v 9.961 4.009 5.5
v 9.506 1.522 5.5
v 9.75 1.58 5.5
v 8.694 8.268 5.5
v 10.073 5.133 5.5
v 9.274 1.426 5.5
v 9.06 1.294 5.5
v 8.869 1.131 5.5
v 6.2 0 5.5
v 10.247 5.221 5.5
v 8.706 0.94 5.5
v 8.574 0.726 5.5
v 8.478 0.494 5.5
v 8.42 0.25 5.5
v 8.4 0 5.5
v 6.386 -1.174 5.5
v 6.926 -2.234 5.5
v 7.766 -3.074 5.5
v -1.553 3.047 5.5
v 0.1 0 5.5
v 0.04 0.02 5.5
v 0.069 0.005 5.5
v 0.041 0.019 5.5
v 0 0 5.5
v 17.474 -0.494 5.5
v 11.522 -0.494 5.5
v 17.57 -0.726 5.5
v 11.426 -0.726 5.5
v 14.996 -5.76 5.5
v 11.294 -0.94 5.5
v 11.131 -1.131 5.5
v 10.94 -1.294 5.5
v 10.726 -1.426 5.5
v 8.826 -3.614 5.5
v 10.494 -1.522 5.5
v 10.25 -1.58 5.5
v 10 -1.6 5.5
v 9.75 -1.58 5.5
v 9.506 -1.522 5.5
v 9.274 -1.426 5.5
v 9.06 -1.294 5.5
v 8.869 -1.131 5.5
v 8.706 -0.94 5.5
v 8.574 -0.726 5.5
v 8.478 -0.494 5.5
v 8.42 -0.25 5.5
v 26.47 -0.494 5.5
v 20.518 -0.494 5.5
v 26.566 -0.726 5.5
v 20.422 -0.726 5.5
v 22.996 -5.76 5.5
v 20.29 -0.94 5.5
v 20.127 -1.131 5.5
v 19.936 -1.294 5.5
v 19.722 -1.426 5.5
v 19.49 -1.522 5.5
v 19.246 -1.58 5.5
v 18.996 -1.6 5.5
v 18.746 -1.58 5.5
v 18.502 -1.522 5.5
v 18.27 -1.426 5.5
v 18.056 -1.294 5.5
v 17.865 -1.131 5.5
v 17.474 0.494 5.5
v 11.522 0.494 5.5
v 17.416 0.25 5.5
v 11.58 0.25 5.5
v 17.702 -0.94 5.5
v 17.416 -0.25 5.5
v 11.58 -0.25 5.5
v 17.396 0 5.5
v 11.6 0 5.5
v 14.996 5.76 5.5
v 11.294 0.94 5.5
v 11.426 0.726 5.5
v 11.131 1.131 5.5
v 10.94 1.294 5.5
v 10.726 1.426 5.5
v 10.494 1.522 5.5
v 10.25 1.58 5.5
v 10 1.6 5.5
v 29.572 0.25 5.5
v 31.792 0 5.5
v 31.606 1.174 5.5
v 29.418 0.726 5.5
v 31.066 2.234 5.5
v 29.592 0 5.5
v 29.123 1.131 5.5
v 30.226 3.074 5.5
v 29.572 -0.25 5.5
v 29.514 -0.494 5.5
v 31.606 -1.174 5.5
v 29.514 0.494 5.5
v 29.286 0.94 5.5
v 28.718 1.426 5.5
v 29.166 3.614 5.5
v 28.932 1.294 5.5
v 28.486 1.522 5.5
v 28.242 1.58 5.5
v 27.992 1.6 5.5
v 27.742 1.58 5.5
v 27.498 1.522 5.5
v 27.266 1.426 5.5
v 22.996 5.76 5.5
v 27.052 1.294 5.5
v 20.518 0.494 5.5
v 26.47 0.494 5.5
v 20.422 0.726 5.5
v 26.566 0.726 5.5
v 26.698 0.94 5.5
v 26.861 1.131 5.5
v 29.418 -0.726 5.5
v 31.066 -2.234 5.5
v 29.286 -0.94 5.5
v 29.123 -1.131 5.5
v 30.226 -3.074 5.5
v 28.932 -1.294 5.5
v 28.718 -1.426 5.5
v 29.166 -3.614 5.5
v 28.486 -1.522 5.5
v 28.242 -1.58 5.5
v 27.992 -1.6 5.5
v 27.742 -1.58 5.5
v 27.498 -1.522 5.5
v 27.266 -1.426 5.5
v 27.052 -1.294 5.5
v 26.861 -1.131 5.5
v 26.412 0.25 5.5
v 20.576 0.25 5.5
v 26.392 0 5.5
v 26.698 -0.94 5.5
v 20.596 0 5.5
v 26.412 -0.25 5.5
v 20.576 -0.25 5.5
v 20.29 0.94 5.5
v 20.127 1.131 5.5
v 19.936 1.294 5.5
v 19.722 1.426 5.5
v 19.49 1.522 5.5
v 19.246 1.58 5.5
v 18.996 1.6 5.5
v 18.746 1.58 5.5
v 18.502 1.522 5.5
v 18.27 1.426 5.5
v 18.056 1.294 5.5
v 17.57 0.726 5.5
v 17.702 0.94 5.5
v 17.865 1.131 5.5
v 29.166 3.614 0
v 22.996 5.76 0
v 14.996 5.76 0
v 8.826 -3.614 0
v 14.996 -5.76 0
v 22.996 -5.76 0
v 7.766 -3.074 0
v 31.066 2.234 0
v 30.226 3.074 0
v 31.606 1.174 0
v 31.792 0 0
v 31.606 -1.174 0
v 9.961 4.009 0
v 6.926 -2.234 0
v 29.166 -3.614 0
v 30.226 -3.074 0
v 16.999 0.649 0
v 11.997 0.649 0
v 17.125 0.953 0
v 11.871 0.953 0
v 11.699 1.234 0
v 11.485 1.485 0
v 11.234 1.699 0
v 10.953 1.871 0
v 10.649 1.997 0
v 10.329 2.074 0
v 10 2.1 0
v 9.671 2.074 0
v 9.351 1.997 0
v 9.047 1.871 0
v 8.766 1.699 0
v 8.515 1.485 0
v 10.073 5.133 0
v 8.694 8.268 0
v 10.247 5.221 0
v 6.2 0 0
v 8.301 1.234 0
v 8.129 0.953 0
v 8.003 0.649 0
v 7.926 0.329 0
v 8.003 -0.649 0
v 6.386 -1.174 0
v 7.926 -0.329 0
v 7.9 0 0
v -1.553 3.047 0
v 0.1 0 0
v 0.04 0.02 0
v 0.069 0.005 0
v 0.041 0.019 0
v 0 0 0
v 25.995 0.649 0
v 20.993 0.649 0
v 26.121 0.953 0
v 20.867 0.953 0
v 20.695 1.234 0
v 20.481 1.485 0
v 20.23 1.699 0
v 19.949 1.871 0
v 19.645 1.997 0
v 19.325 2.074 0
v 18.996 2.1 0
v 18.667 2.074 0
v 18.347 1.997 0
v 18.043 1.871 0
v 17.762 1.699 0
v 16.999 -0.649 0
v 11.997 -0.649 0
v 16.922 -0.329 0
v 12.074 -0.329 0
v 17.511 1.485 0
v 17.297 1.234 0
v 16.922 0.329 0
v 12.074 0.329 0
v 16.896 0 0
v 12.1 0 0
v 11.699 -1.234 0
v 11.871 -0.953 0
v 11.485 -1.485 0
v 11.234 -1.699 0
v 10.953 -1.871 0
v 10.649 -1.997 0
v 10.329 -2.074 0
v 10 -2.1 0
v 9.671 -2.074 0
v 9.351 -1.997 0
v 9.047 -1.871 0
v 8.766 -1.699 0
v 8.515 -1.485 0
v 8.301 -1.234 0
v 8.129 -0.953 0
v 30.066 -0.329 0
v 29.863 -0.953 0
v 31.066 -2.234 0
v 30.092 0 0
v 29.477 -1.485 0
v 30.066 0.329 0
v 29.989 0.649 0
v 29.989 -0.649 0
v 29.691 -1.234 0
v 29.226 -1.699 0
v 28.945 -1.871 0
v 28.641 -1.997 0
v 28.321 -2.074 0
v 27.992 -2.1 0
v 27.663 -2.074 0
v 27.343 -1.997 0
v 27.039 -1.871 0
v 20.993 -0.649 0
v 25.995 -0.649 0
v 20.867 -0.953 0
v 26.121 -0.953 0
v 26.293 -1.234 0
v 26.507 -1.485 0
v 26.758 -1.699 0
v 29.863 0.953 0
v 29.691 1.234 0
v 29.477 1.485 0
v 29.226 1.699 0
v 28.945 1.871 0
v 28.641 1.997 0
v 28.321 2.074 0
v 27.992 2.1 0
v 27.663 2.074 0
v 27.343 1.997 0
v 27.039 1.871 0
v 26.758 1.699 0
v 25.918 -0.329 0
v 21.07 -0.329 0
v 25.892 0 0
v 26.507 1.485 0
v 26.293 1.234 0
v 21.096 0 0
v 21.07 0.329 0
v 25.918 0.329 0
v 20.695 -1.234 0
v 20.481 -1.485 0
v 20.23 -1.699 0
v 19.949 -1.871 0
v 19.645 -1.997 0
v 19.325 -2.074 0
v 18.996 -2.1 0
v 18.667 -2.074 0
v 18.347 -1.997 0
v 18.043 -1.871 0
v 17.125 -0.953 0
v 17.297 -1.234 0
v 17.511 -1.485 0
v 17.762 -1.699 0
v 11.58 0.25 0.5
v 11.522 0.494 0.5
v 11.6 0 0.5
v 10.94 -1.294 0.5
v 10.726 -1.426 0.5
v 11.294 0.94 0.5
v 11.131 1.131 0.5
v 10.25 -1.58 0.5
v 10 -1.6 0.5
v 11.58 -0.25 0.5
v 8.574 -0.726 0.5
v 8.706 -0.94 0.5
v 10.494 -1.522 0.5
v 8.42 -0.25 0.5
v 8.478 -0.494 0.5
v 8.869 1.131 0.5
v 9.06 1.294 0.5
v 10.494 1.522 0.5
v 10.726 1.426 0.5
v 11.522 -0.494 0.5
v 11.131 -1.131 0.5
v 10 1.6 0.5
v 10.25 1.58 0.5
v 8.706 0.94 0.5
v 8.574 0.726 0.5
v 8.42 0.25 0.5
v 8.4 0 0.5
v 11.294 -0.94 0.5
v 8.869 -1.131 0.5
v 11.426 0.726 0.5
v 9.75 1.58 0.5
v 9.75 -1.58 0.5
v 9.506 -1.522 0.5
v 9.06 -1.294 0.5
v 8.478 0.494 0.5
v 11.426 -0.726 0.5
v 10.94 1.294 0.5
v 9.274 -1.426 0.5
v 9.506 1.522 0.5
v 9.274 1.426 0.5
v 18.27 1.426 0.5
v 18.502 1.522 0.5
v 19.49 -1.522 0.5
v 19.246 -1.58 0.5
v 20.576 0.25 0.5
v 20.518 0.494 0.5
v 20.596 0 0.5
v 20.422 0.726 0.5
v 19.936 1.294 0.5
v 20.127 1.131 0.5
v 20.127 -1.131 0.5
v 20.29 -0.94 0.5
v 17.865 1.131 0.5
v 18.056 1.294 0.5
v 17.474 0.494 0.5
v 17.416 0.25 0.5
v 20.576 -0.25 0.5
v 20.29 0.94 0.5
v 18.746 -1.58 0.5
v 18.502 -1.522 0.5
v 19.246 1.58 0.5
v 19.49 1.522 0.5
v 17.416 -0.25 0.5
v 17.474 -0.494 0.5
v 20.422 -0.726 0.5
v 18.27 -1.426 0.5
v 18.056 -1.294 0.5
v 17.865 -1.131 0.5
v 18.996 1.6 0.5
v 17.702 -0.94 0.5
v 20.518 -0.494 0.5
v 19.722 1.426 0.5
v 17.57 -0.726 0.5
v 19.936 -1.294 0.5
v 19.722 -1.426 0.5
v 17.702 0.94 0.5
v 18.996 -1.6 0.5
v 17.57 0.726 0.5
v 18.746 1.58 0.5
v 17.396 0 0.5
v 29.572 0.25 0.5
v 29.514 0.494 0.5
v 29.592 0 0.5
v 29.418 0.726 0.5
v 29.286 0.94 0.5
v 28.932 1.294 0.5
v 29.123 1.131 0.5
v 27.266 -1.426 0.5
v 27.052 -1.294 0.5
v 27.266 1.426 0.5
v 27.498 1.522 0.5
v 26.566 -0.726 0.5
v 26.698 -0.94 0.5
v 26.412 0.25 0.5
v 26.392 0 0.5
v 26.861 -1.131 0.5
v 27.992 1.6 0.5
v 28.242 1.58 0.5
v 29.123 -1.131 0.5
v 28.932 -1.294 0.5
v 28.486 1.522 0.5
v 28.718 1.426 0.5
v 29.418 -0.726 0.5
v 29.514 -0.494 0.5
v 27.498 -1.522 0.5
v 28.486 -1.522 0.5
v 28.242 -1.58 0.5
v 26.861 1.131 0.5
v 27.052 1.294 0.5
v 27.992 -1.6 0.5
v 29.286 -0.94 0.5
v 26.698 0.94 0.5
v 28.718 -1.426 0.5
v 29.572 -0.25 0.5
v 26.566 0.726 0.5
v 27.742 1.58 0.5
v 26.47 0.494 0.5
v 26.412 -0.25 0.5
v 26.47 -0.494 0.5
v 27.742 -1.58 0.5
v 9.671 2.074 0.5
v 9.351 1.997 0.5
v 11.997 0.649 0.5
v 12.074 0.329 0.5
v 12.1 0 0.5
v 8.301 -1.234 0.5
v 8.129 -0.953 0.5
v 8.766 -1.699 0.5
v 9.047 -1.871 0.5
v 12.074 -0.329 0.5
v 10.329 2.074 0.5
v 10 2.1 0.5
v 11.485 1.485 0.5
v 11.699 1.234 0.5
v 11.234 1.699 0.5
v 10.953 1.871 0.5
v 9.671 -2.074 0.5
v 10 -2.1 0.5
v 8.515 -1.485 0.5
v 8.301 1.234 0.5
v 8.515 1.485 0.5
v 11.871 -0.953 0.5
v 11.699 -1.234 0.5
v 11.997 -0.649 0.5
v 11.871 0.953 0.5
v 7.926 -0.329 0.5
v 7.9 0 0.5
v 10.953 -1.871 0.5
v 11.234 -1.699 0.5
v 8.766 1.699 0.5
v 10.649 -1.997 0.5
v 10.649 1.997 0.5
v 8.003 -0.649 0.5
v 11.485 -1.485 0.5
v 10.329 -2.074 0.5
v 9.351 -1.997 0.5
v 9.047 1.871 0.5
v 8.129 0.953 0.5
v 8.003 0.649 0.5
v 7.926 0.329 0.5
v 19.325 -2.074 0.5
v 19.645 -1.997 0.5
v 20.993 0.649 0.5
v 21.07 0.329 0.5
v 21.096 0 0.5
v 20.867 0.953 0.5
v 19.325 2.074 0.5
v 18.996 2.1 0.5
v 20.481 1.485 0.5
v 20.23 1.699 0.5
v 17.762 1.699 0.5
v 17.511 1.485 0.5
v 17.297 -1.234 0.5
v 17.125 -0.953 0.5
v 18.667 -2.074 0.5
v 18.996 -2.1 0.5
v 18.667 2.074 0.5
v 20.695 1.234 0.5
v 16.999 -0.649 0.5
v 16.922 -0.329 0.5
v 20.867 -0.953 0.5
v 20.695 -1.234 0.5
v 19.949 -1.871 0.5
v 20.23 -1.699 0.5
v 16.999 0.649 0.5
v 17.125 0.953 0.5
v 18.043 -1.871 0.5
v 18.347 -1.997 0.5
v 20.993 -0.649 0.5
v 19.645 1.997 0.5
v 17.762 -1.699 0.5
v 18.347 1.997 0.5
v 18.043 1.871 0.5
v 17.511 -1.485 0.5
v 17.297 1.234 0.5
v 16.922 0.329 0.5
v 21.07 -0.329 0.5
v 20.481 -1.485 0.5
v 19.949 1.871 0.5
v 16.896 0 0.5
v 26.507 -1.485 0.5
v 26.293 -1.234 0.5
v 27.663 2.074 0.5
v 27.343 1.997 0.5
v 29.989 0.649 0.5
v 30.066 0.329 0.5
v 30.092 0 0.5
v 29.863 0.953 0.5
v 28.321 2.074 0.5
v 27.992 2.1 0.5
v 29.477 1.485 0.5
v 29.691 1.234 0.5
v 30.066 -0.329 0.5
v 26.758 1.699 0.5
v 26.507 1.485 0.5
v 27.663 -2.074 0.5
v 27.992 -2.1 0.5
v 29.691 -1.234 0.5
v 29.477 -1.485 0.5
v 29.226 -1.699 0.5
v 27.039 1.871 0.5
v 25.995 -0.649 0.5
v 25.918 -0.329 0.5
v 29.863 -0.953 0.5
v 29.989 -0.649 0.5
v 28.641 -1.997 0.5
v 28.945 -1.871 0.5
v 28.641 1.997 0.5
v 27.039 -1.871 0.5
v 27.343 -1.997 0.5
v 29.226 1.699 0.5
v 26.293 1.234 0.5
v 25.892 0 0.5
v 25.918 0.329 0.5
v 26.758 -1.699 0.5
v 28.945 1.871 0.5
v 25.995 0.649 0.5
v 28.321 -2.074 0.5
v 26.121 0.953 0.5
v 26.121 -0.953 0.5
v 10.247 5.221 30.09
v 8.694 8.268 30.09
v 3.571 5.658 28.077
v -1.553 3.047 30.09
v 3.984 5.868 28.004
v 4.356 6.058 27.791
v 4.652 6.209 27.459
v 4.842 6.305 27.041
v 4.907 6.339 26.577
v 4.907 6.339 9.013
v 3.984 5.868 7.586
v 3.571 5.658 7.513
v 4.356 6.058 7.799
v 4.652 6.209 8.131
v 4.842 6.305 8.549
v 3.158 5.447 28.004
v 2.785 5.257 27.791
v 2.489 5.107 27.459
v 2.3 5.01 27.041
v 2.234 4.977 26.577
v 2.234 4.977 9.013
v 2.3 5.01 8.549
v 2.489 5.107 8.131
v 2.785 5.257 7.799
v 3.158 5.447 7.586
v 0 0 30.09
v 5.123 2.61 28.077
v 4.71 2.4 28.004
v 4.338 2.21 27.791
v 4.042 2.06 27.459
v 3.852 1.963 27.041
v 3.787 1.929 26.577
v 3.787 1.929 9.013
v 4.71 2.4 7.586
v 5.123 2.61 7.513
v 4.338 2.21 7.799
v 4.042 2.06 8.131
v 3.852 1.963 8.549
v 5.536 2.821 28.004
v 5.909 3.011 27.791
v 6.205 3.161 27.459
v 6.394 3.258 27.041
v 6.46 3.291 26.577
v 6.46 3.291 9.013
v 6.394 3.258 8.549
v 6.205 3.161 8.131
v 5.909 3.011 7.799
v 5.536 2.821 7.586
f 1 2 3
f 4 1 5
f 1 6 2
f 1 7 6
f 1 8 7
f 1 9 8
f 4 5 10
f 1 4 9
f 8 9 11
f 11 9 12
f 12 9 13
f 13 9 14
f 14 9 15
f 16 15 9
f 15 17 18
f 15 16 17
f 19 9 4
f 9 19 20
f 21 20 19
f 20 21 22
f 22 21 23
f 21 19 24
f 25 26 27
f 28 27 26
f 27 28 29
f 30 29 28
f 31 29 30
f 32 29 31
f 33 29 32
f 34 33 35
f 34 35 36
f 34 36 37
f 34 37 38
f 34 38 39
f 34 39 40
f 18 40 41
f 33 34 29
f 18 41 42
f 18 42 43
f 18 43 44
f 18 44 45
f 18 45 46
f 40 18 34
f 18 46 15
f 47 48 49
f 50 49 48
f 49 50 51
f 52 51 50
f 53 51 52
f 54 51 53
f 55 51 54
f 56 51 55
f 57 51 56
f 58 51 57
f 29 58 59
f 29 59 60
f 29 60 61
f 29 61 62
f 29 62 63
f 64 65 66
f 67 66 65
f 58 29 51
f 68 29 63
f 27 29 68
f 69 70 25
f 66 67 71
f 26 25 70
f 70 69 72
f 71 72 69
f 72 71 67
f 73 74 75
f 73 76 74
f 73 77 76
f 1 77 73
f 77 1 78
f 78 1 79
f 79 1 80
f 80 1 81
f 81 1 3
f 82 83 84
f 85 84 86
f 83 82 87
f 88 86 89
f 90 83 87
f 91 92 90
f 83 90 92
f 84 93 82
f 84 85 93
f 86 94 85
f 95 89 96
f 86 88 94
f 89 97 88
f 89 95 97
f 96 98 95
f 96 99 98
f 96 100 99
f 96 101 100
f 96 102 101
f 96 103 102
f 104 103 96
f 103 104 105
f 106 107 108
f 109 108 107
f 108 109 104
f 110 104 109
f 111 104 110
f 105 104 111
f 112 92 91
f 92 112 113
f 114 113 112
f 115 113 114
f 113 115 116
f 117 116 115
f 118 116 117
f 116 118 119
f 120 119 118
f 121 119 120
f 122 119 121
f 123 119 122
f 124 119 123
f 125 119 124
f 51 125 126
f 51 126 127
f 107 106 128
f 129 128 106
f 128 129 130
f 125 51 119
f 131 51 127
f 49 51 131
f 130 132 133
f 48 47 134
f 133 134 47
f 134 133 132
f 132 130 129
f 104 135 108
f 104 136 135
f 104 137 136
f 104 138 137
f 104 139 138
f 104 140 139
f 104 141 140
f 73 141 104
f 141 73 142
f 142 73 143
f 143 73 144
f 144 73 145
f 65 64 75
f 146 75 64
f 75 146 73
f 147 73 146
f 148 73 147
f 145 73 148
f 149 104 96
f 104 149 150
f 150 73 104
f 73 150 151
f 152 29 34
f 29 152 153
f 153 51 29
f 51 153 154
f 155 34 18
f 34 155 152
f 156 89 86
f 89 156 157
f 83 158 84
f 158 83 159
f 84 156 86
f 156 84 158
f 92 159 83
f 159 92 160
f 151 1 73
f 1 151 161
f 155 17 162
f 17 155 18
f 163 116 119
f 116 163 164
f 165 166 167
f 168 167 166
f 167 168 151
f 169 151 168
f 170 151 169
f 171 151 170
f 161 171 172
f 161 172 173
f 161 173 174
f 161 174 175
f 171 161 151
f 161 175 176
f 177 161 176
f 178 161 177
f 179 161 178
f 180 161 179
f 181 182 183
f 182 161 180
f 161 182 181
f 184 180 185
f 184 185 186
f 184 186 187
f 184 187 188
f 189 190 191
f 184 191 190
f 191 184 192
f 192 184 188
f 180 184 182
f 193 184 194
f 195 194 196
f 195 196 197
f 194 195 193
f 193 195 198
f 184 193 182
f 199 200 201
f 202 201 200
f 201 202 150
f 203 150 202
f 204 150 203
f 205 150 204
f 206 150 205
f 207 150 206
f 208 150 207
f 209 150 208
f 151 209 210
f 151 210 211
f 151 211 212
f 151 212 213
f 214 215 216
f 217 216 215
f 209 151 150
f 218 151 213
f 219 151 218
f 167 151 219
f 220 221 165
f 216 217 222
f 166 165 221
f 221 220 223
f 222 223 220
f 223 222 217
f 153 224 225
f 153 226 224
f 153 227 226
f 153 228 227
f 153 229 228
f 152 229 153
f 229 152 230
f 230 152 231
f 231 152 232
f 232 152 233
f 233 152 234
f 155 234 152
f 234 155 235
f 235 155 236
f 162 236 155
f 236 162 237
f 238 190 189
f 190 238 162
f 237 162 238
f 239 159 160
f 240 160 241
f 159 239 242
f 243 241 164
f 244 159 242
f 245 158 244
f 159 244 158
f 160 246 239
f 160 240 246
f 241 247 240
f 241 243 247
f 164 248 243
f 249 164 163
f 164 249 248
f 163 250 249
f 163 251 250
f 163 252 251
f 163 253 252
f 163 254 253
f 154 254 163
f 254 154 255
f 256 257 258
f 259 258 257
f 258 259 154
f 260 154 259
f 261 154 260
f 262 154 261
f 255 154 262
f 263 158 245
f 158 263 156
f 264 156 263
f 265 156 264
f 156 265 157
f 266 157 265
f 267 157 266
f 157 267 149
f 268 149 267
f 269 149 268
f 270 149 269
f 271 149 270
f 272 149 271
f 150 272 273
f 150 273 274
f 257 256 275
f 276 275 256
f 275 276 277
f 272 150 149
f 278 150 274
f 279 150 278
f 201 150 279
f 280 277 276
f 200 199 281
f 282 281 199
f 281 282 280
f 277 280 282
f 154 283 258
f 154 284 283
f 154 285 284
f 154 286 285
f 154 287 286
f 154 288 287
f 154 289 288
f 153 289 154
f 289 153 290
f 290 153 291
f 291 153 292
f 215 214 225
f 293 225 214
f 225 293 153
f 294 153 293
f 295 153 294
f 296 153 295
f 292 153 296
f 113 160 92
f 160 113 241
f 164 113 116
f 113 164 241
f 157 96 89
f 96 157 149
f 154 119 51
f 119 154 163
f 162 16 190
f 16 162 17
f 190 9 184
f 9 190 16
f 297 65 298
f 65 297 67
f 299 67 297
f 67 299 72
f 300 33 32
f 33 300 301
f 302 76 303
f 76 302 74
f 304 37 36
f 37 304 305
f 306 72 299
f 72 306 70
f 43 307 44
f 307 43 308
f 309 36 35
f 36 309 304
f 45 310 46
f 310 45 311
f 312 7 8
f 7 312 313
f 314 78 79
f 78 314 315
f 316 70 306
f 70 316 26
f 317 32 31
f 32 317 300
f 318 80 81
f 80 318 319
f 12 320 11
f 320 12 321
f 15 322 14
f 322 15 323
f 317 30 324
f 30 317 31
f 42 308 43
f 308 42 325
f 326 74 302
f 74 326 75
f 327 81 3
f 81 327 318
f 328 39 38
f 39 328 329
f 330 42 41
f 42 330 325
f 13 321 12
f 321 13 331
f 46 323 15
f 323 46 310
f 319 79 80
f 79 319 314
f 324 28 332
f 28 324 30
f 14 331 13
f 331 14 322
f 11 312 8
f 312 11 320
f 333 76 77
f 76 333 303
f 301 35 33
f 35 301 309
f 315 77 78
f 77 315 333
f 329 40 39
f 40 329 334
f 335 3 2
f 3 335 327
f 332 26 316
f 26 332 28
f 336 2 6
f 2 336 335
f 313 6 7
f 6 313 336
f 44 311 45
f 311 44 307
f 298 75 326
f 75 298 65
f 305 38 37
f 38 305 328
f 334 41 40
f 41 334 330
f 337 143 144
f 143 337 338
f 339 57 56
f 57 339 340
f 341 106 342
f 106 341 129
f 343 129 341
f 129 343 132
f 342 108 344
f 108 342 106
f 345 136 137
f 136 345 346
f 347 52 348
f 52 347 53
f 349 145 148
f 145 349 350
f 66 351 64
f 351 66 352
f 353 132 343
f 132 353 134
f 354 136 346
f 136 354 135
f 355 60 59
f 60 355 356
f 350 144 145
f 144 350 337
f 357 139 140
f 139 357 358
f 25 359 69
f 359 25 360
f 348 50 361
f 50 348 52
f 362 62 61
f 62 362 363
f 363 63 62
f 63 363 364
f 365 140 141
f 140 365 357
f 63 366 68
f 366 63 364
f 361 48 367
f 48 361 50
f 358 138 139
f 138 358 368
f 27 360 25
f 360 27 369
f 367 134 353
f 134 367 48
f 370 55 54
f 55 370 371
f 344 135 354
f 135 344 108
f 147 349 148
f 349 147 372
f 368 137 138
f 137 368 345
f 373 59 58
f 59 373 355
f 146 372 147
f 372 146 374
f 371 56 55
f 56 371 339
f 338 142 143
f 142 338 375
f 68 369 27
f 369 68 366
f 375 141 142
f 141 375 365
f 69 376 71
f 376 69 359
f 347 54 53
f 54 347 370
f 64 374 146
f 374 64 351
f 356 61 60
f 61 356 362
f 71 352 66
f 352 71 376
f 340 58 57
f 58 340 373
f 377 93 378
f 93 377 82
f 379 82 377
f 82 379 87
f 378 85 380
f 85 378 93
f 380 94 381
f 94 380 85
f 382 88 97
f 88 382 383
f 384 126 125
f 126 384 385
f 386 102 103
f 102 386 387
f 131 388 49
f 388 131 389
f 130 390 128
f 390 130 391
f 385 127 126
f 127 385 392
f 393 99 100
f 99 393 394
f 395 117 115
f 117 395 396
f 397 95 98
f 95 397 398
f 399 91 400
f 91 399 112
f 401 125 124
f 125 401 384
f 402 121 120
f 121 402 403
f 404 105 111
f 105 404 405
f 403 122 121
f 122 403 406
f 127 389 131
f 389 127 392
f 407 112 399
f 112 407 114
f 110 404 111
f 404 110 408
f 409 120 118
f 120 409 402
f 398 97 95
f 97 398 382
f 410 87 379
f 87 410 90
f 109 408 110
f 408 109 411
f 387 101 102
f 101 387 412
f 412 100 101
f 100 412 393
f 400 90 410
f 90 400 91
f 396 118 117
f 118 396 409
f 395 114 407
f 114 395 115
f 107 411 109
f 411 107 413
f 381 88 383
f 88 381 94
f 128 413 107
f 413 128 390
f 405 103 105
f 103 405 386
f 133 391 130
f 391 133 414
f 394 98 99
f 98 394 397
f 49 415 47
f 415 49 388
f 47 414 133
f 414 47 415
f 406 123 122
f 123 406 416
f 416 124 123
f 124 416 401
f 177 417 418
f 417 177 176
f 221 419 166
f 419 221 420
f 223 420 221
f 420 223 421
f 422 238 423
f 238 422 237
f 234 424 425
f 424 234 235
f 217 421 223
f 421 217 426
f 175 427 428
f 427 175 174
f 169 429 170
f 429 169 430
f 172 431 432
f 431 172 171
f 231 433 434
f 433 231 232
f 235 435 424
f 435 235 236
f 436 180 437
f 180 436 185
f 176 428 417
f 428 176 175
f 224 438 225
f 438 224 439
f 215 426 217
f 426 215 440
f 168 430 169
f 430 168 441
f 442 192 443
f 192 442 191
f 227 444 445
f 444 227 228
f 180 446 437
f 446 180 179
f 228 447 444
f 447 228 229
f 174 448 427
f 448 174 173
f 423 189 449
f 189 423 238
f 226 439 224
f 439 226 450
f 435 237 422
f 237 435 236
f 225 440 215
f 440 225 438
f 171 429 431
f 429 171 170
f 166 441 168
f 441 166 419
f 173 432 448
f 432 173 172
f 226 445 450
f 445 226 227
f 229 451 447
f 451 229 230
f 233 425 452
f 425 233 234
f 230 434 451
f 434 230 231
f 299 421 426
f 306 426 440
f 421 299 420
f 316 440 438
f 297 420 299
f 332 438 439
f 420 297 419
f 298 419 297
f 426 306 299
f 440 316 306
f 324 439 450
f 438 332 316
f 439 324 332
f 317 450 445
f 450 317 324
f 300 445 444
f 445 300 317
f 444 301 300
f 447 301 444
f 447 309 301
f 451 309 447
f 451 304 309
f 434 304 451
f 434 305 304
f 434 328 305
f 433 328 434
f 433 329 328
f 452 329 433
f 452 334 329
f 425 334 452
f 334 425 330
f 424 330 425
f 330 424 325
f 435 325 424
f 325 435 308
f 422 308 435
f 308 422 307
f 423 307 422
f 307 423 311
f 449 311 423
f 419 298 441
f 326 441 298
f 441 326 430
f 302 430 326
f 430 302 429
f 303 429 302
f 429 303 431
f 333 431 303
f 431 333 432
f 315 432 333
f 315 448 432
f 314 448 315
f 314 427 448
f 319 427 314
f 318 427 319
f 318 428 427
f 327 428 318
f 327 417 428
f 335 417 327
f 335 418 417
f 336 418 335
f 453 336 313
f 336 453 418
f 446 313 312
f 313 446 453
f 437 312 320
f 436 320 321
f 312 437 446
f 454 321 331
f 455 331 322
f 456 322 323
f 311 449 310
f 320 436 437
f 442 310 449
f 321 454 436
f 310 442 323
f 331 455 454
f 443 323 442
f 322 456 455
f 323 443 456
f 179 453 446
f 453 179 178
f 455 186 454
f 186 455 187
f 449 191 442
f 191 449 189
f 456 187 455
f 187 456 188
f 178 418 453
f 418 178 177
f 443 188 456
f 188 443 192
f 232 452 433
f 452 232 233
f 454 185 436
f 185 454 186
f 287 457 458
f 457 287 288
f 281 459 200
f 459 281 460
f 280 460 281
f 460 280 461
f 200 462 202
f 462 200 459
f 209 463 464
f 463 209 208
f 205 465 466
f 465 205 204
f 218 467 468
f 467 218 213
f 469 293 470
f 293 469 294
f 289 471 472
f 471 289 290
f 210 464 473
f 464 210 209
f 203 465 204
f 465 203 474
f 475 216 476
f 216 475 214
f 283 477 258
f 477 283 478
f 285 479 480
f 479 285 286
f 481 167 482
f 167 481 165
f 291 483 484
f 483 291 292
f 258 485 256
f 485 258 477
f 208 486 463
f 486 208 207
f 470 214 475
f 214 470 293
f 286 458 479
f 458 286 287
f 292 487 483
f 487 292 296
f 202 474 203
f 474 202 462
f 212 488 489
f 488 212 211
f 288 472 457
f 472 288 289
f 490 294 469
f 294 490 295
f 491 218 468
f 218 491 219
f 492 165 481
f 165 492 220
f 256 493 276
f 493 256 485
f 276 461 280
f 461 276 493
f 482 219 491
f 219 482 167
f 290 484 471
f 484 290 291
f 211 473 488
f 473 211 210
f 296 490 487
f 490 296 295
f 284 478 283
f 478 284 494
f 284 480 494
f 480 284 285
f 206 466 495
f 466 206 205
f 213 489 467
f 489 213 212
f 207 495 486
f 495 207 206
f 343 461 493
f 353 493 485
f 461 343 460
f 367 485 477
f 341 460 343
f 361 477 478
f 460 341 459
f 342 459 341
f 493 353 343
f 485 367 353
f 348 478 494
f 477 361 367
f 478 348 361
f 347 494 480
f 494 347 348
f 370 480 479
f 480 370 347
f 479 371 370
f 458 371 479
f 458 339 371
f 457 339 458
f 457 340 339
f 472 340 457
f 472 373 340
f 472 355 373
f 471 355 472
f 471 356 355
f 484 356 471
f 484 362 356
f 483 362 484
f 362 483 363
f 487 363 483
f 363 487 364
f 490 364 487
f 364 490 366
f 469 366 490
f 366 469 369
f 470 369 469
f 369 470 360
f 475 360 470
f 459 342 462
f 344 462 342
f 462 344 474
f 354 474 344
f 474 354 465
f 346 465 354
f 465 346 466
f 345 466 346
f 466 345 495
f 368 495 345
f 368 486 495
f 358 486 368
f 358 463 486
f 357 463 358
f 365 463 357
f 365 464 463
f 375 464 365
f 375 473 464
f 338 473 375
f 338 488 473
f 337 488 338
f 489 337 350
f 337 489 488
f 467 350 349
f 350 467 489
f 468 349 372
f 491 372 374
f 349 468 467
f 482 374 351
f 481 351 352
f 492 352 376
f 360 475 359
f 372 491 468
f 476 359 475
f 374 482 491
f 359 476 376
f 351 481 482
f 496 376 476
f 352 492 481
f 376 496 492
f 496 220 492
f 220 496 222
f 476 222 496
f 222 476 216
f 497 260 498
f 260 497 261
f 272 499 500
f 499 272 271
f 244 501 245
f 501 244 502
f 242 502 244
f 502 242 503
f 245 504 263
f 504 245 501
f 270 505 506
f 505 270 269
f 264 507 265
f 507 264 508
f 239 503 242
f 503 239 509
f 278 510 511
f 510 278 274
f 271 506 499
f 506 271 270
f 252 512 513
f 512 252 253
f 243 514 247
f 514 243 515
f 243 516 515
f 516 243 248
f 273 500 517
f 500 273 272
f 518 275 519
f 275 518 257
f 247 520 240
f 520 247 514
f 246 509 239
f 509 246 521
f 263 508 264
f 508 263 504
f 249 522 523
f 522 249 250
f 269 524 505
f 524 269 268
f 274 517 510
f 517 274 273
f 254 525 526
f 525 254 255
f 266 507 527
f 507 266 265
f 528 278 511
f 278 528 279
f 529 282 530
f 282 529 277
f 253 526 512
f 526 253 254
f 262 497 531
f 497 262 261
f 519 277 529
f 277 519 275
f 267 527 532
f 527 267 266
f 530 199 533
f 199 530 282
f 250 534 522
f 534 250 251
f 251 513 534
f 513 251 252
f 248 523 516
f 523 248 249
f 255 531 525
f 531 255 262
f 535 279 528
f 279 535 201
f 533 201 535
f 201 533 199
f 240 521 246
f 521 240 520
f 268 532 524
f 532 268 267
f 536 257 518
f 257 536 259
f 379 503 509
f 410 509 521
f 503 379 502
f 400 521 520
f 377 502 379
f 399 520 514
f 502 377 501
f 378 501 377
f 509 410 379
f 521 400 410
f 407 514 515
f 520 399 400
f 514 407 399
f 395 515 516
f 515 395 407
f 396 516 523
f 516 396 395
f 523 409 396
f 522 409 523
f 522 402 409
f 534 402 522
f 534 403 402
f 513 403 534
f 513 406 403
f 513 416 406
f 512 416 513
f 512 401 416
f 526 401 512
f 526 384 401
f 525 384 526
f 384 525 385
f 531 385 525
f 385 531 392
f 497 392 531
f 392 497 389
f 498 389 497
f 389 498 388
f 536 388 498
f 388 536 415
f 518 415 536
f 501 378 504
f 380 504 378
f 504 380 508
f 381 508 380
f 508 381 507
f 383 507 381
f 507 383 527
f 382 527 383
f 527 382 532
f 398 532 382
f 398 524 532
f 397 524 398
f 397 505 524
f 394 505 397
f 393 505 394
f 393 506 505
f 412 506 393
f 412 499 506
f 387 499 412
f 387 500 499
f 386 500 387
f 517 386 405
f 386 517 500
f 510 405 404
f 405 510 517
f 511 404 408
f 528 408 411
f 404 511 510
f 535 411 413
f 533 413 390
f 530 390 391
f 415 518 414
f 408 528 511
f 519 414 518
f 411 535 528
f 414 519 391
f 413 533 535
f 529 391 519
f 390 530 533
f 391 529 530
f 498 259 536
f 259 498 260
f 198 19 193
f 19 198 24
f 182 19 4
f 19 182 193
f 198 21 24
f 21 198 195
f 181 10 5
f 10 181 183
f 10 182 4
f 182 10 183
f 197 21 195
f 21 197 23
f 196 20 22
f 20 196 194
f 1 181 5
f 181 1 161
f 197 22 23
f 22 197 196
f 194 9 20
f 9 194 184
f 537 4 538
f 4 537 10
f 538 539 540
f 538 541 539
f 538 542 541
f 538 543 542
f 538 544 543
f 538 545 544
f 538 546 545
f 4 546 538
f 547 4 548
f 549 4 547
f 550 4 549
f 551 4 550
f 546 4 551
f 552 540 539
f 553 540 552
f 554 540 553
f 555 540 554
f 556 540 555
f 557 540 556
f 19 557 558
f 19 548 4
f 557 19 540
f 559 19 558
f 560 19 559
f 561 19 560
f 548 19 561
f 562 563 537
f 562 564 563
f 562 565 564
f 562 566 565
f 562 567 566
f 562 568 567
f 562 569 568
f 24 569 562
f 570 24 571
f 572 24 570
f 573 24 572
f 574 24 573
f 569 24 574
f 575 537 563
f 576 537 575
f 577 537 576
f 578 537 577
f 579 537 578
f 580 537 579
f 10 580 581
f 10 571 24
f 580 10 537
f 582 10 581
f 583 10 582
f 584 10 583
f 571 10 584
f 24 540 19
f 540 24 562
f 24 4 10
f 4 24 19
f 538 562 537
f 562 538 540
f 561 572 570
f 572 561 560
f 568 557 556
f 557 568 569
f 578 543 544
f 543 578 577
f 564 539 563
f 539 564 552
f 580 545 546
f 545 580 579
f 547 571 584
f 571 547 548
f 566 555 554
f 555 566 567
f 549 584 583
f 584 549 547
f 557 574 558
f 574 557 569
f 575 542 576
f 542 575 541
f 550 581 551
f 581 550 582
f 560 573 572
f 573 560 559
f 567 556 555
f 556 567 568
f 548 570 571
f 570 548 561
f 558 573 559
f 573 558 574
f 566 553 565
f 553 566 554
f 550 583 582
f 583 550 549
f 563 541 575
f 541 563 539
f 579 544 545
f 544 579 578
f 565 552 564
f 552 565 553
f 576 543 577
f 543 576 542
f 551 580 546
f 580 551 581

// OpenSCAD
/* vim: set expandtab smartindent  fdm=indent shiftwidth=4 ss=4 tabstop=4 : */
$fn=20;

module bltouch () {
    head_thick = 5.5;
    leg_thick = 3.42;
    angle = 27;
    
    module head(thick, angle) {
        hole = 1.6;
        outer_circle = 3.8;
        dist=(21.192 - (hole*2));
        cube_width = 8;
        cube_depth = 11.52;
    
        translate([-10,0,0]) rotate([0,0,angle]) cube([11.50,leg_thick,head_thick]);
        
        hull(){
            translate([-9.9,0.1,0]) cylinder(r=0.1, h=thick);
            translate([0,5.4,0]) cylinder(r=0.1, h=thick);
            translate([-0.2,3.4,0]) cylinder(r=0.1, h=thick);
        }
        hull(){
            translate([-9.9,0.1,0]) cylinder(r=0.1, h=thick);
            translate([-3,0.1,0]) cylinder(r=0.1, h=thick);
            translate([0,5.4,0]) cylinder(r=0.1, h=thick);
        }
    
        difference(){
            hull (){
                cylinder (h=thick, r=outer_circle, center = false);
                translate([dist,0,0]) cylinder (h=thick, r=outer_circle, center = false);
                translate([(dist/2) - (8/2),-(cube_depth/2),0]) cube([cube_width, cube_depth, thick]);
            }
            cylinder (h=thick, r=hole, center = false, $fn=40);
            translate([dist/2,0,0]) cylinder (h=thick, r=hole, center = false, $fn=40);
            translate([dist,0,0]) cylinder (h=thick, r=hole, center = false, $fn=40);

            h = hole +0.5;
            t = 0.5;
            cylinder (h=t, r=h, center = false, $fn=40);
            translate([dist/2,0,0]) cylinder (h=t, r=h, center = false, $fn=40);
            translate([dist,0,0]) cylinder (h=t, r=h, center = false, $fn=40);
    
        }
    
    }
    
    module leg(t, w, d) {
        difference() {
            cube([w,d,t]);
            hull(){
                translate([w/2, d/7, 0]) cylinder(r=1.5, h=t);
                translate([w/2, d-(d/7), 0]) cylinder(r=1.5, h=t);
            }
        }
    }
    
    translate([10,0,0]) head(head_thick, angle);
    translate([0,0,head_thick+24.59]) rotate([-90,0,angle]) leg(leg_thick, 11.50, 24.59);
}

bltouch();
